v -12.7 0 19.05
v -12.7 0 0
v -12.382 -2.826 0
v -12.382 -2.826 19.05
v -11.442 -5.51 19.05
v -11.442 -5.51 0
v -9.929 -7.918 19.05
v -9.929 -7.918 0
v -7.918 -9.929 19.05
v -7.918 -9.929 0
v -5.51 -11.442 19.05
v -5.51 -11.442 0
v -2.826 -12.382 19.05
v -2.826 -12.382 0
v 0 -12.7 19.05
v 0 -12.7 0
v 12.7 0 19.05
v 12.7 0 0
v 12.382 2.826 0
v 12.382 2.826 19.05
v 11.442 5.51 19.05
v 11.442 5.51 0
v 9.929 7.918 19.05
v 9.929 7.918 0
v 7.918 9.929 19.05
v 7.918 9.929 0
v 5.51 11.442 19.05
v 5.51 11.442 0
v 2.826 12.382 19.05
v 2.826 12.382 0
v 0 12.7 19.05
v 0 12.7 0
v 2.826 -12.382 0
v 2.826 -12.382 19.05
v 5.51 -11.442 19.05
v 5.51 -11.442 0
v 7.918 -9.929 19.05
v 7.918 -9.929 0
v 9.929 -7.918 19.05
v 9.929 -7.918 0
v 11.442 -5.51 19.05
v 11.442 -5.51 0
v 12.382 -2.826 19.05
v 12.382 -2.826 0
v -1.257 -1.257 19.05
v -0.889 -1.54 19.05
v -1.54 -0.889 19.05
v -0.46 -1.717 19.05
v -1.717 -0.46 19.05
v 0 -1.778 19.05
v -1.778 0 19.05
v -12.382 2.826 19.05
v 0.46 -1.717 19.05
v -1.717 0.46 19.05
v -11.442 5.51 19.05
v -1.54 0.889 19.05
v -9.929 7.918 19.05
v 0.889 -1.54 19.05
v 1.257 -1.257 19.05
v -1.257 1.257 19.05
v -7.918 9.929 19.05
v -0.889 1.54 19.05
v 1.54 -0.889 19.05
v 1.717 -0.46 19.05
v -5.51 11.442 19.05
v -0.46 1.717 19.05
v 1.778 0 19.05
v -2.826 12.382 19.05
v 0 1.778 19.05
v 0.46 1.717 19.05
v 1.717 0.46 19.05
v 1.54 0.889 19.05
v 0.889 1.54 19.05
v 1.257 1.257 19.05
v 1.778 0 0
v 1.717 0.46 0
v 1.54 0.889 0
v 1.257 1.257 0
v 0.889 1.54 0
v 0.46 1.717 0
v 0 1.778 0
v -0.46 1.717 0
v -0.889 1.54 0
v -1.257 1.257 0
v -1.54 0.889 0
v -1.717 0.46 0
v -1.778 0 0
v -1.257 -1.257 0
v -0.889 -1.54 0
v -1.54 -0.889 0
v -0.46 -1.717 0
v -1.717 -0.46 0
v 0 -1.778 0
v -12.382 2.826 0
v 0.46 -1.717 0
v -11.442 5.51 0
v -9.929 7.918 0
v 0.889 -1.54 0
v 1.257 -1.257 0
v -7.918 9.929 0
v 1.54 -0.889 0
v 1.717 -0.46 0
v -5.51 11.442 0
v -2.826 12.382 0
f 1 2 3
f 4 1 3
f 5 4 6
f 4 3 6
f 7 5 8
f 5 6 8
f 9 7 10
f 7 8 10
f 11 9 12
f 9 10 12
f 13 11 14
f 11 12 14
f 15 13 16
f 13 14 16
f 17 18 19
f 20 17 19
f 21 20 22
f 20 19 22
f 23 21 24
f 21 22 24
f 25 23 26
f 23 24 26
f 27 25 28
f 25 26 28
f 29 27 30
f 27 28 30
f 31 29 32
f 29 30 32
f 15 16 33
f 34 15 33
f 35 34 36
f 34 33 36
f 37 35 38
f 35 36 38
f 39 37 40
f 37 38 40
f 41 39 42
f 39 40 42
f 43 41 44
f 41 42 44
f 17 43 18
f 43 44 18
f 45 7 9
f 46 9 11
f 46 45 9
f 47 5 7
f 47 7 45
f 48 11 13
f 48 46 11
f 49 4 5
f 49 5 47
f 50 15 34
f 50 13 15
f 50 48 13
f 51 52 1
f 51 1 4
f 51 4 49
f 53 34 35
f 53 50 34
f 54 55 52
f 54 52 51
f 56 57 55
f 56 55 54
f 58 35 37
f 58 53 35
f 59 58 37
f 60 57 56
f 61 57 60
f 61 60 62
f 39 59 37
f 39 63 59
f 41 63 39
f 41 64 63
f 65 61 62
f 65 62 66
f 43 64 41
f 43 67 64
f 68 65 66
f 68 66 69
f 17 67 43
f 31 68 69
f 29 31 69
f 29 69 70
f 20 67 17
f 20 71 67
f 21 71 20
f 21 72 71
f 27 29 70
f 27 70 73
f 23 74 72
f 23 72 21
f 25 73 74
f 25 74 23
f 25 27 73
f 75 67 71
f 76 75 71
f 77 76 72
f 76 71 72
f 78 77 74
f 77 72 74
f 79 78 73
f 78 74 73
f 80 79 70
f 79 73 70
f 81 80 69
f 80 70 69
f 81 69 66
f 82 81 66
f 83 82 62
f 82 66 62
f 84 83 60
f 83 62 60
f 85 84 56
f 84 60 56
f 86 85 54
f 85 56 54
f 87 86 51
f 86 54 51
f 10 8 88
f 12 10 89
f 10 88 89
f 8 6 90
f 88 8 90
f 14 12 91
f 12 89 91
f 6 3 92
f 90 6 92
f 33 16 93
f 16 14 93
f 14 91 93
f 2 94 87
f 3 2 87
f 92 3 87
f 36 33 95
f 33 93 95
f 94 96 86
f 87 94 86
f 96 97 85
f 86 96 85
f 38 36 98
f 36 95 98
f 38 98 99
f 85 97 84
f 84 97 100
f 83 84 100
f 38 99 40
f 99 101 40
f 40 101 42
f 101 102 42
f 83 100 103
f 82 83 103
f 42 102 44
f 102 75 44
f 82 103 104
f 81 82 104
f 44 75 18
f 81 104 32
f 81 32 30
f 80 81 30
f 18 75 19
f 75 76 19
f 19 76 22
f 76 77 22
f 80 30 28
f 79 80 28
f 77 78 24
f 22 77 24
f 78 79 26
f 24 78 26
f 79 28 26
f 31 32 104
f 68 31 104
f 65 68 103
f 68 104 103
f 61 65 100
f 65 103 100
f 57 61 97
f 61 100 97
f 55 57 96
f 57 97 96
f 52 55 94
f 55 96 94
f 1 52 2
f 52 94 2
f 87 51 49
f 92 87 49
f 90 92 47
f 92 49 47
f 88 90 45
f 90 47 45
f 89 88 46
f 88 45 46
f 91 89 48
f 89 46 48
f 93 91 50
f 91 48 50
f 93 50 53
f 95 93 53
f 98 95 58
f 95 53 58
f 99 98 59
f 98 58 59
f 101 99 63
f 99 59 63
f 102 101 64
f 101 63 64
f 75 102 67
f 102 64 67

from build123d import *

# Parameters (mm, degrees)
F1_DEPTH = 19.05
F3_DEPTH = 134.874


with BuildPart() as f1:
    # F0 (on Top) → F1 (new body)
    with BuildSketch(Plane.XY):
        with BuildLine():
            Line((-12.7, 0), (0, 0))
            Line((0, 0), (0, 12.7))
            ThreePointArc((0, 12.7), (-8.9802561211, 8.9802561211), (-12.7, 0))
        make_face()
        with BuildLine():
            Line((0, 12.7), (0, 0))
            Line((0, 0), (12.7, 0))
            ThreePointArc((12.7, 0), (8.9802561211, 8.9802561211), (0, 12.7))
        make_face()
        with BuildLine():
            Line((12.7, 0), (0, 0))
            Line((0, 0), (0, -12.7))
            ThreePointArc((0, -12.7), (8.9802561211, -8.9802561211), (12.7, 0))
        make_face()
        with BuildLine():
            Line((0, -12.7), (0, 0))
            Line((0, 0), (-12.7, 0))
            ThreePointArc((-12.7, 0), (-8.9802561211, -8.9802561211), (0, -12.7))
        make_face()
    extrude(amount=F1_DEPTH)

    # F2 (on face) → F3 (cut)
    with BuildSketch(Plane.XY.offset(19.05)):
        with BuildLine():
            Line((-1.778, 0), (0, 0))
            Line((0, 0), (0, 1.778))
            ThreePointArc((0, 1.778), (-1.2572358569, 1.2572358569), (-1.778, 0))
        make_face()
        with BuildLine():
            Line((0, 1.778), (0, 0))
            Line((0, 0), (1.778, 0))
            ThreePointArc((1.778, 0), (1.2572358569, 1.2572358569), (0, 1.778))
        make_face()
        with BuildLine():
            Line((1.778, 0), (0, 0))
            Line((0, 0), (0, -1.778))
            ThreePointArc((0, -1.778), (1.2572358569, -1.2572358569), (1.778, 0))
        make_face()
        with BuildLine():
            Line((0, -1.778), (0, 0))
            Line((0, 0), (-1.778, 0))
            ThreePointArc((-1.778, 0), (-1.2572358569, -1.2572358569), (0, -1.778))
        make_face()
    extrude(amount=-F3_DEPTH, mode=Mode.SUBTRACT)


solid = f1.part
